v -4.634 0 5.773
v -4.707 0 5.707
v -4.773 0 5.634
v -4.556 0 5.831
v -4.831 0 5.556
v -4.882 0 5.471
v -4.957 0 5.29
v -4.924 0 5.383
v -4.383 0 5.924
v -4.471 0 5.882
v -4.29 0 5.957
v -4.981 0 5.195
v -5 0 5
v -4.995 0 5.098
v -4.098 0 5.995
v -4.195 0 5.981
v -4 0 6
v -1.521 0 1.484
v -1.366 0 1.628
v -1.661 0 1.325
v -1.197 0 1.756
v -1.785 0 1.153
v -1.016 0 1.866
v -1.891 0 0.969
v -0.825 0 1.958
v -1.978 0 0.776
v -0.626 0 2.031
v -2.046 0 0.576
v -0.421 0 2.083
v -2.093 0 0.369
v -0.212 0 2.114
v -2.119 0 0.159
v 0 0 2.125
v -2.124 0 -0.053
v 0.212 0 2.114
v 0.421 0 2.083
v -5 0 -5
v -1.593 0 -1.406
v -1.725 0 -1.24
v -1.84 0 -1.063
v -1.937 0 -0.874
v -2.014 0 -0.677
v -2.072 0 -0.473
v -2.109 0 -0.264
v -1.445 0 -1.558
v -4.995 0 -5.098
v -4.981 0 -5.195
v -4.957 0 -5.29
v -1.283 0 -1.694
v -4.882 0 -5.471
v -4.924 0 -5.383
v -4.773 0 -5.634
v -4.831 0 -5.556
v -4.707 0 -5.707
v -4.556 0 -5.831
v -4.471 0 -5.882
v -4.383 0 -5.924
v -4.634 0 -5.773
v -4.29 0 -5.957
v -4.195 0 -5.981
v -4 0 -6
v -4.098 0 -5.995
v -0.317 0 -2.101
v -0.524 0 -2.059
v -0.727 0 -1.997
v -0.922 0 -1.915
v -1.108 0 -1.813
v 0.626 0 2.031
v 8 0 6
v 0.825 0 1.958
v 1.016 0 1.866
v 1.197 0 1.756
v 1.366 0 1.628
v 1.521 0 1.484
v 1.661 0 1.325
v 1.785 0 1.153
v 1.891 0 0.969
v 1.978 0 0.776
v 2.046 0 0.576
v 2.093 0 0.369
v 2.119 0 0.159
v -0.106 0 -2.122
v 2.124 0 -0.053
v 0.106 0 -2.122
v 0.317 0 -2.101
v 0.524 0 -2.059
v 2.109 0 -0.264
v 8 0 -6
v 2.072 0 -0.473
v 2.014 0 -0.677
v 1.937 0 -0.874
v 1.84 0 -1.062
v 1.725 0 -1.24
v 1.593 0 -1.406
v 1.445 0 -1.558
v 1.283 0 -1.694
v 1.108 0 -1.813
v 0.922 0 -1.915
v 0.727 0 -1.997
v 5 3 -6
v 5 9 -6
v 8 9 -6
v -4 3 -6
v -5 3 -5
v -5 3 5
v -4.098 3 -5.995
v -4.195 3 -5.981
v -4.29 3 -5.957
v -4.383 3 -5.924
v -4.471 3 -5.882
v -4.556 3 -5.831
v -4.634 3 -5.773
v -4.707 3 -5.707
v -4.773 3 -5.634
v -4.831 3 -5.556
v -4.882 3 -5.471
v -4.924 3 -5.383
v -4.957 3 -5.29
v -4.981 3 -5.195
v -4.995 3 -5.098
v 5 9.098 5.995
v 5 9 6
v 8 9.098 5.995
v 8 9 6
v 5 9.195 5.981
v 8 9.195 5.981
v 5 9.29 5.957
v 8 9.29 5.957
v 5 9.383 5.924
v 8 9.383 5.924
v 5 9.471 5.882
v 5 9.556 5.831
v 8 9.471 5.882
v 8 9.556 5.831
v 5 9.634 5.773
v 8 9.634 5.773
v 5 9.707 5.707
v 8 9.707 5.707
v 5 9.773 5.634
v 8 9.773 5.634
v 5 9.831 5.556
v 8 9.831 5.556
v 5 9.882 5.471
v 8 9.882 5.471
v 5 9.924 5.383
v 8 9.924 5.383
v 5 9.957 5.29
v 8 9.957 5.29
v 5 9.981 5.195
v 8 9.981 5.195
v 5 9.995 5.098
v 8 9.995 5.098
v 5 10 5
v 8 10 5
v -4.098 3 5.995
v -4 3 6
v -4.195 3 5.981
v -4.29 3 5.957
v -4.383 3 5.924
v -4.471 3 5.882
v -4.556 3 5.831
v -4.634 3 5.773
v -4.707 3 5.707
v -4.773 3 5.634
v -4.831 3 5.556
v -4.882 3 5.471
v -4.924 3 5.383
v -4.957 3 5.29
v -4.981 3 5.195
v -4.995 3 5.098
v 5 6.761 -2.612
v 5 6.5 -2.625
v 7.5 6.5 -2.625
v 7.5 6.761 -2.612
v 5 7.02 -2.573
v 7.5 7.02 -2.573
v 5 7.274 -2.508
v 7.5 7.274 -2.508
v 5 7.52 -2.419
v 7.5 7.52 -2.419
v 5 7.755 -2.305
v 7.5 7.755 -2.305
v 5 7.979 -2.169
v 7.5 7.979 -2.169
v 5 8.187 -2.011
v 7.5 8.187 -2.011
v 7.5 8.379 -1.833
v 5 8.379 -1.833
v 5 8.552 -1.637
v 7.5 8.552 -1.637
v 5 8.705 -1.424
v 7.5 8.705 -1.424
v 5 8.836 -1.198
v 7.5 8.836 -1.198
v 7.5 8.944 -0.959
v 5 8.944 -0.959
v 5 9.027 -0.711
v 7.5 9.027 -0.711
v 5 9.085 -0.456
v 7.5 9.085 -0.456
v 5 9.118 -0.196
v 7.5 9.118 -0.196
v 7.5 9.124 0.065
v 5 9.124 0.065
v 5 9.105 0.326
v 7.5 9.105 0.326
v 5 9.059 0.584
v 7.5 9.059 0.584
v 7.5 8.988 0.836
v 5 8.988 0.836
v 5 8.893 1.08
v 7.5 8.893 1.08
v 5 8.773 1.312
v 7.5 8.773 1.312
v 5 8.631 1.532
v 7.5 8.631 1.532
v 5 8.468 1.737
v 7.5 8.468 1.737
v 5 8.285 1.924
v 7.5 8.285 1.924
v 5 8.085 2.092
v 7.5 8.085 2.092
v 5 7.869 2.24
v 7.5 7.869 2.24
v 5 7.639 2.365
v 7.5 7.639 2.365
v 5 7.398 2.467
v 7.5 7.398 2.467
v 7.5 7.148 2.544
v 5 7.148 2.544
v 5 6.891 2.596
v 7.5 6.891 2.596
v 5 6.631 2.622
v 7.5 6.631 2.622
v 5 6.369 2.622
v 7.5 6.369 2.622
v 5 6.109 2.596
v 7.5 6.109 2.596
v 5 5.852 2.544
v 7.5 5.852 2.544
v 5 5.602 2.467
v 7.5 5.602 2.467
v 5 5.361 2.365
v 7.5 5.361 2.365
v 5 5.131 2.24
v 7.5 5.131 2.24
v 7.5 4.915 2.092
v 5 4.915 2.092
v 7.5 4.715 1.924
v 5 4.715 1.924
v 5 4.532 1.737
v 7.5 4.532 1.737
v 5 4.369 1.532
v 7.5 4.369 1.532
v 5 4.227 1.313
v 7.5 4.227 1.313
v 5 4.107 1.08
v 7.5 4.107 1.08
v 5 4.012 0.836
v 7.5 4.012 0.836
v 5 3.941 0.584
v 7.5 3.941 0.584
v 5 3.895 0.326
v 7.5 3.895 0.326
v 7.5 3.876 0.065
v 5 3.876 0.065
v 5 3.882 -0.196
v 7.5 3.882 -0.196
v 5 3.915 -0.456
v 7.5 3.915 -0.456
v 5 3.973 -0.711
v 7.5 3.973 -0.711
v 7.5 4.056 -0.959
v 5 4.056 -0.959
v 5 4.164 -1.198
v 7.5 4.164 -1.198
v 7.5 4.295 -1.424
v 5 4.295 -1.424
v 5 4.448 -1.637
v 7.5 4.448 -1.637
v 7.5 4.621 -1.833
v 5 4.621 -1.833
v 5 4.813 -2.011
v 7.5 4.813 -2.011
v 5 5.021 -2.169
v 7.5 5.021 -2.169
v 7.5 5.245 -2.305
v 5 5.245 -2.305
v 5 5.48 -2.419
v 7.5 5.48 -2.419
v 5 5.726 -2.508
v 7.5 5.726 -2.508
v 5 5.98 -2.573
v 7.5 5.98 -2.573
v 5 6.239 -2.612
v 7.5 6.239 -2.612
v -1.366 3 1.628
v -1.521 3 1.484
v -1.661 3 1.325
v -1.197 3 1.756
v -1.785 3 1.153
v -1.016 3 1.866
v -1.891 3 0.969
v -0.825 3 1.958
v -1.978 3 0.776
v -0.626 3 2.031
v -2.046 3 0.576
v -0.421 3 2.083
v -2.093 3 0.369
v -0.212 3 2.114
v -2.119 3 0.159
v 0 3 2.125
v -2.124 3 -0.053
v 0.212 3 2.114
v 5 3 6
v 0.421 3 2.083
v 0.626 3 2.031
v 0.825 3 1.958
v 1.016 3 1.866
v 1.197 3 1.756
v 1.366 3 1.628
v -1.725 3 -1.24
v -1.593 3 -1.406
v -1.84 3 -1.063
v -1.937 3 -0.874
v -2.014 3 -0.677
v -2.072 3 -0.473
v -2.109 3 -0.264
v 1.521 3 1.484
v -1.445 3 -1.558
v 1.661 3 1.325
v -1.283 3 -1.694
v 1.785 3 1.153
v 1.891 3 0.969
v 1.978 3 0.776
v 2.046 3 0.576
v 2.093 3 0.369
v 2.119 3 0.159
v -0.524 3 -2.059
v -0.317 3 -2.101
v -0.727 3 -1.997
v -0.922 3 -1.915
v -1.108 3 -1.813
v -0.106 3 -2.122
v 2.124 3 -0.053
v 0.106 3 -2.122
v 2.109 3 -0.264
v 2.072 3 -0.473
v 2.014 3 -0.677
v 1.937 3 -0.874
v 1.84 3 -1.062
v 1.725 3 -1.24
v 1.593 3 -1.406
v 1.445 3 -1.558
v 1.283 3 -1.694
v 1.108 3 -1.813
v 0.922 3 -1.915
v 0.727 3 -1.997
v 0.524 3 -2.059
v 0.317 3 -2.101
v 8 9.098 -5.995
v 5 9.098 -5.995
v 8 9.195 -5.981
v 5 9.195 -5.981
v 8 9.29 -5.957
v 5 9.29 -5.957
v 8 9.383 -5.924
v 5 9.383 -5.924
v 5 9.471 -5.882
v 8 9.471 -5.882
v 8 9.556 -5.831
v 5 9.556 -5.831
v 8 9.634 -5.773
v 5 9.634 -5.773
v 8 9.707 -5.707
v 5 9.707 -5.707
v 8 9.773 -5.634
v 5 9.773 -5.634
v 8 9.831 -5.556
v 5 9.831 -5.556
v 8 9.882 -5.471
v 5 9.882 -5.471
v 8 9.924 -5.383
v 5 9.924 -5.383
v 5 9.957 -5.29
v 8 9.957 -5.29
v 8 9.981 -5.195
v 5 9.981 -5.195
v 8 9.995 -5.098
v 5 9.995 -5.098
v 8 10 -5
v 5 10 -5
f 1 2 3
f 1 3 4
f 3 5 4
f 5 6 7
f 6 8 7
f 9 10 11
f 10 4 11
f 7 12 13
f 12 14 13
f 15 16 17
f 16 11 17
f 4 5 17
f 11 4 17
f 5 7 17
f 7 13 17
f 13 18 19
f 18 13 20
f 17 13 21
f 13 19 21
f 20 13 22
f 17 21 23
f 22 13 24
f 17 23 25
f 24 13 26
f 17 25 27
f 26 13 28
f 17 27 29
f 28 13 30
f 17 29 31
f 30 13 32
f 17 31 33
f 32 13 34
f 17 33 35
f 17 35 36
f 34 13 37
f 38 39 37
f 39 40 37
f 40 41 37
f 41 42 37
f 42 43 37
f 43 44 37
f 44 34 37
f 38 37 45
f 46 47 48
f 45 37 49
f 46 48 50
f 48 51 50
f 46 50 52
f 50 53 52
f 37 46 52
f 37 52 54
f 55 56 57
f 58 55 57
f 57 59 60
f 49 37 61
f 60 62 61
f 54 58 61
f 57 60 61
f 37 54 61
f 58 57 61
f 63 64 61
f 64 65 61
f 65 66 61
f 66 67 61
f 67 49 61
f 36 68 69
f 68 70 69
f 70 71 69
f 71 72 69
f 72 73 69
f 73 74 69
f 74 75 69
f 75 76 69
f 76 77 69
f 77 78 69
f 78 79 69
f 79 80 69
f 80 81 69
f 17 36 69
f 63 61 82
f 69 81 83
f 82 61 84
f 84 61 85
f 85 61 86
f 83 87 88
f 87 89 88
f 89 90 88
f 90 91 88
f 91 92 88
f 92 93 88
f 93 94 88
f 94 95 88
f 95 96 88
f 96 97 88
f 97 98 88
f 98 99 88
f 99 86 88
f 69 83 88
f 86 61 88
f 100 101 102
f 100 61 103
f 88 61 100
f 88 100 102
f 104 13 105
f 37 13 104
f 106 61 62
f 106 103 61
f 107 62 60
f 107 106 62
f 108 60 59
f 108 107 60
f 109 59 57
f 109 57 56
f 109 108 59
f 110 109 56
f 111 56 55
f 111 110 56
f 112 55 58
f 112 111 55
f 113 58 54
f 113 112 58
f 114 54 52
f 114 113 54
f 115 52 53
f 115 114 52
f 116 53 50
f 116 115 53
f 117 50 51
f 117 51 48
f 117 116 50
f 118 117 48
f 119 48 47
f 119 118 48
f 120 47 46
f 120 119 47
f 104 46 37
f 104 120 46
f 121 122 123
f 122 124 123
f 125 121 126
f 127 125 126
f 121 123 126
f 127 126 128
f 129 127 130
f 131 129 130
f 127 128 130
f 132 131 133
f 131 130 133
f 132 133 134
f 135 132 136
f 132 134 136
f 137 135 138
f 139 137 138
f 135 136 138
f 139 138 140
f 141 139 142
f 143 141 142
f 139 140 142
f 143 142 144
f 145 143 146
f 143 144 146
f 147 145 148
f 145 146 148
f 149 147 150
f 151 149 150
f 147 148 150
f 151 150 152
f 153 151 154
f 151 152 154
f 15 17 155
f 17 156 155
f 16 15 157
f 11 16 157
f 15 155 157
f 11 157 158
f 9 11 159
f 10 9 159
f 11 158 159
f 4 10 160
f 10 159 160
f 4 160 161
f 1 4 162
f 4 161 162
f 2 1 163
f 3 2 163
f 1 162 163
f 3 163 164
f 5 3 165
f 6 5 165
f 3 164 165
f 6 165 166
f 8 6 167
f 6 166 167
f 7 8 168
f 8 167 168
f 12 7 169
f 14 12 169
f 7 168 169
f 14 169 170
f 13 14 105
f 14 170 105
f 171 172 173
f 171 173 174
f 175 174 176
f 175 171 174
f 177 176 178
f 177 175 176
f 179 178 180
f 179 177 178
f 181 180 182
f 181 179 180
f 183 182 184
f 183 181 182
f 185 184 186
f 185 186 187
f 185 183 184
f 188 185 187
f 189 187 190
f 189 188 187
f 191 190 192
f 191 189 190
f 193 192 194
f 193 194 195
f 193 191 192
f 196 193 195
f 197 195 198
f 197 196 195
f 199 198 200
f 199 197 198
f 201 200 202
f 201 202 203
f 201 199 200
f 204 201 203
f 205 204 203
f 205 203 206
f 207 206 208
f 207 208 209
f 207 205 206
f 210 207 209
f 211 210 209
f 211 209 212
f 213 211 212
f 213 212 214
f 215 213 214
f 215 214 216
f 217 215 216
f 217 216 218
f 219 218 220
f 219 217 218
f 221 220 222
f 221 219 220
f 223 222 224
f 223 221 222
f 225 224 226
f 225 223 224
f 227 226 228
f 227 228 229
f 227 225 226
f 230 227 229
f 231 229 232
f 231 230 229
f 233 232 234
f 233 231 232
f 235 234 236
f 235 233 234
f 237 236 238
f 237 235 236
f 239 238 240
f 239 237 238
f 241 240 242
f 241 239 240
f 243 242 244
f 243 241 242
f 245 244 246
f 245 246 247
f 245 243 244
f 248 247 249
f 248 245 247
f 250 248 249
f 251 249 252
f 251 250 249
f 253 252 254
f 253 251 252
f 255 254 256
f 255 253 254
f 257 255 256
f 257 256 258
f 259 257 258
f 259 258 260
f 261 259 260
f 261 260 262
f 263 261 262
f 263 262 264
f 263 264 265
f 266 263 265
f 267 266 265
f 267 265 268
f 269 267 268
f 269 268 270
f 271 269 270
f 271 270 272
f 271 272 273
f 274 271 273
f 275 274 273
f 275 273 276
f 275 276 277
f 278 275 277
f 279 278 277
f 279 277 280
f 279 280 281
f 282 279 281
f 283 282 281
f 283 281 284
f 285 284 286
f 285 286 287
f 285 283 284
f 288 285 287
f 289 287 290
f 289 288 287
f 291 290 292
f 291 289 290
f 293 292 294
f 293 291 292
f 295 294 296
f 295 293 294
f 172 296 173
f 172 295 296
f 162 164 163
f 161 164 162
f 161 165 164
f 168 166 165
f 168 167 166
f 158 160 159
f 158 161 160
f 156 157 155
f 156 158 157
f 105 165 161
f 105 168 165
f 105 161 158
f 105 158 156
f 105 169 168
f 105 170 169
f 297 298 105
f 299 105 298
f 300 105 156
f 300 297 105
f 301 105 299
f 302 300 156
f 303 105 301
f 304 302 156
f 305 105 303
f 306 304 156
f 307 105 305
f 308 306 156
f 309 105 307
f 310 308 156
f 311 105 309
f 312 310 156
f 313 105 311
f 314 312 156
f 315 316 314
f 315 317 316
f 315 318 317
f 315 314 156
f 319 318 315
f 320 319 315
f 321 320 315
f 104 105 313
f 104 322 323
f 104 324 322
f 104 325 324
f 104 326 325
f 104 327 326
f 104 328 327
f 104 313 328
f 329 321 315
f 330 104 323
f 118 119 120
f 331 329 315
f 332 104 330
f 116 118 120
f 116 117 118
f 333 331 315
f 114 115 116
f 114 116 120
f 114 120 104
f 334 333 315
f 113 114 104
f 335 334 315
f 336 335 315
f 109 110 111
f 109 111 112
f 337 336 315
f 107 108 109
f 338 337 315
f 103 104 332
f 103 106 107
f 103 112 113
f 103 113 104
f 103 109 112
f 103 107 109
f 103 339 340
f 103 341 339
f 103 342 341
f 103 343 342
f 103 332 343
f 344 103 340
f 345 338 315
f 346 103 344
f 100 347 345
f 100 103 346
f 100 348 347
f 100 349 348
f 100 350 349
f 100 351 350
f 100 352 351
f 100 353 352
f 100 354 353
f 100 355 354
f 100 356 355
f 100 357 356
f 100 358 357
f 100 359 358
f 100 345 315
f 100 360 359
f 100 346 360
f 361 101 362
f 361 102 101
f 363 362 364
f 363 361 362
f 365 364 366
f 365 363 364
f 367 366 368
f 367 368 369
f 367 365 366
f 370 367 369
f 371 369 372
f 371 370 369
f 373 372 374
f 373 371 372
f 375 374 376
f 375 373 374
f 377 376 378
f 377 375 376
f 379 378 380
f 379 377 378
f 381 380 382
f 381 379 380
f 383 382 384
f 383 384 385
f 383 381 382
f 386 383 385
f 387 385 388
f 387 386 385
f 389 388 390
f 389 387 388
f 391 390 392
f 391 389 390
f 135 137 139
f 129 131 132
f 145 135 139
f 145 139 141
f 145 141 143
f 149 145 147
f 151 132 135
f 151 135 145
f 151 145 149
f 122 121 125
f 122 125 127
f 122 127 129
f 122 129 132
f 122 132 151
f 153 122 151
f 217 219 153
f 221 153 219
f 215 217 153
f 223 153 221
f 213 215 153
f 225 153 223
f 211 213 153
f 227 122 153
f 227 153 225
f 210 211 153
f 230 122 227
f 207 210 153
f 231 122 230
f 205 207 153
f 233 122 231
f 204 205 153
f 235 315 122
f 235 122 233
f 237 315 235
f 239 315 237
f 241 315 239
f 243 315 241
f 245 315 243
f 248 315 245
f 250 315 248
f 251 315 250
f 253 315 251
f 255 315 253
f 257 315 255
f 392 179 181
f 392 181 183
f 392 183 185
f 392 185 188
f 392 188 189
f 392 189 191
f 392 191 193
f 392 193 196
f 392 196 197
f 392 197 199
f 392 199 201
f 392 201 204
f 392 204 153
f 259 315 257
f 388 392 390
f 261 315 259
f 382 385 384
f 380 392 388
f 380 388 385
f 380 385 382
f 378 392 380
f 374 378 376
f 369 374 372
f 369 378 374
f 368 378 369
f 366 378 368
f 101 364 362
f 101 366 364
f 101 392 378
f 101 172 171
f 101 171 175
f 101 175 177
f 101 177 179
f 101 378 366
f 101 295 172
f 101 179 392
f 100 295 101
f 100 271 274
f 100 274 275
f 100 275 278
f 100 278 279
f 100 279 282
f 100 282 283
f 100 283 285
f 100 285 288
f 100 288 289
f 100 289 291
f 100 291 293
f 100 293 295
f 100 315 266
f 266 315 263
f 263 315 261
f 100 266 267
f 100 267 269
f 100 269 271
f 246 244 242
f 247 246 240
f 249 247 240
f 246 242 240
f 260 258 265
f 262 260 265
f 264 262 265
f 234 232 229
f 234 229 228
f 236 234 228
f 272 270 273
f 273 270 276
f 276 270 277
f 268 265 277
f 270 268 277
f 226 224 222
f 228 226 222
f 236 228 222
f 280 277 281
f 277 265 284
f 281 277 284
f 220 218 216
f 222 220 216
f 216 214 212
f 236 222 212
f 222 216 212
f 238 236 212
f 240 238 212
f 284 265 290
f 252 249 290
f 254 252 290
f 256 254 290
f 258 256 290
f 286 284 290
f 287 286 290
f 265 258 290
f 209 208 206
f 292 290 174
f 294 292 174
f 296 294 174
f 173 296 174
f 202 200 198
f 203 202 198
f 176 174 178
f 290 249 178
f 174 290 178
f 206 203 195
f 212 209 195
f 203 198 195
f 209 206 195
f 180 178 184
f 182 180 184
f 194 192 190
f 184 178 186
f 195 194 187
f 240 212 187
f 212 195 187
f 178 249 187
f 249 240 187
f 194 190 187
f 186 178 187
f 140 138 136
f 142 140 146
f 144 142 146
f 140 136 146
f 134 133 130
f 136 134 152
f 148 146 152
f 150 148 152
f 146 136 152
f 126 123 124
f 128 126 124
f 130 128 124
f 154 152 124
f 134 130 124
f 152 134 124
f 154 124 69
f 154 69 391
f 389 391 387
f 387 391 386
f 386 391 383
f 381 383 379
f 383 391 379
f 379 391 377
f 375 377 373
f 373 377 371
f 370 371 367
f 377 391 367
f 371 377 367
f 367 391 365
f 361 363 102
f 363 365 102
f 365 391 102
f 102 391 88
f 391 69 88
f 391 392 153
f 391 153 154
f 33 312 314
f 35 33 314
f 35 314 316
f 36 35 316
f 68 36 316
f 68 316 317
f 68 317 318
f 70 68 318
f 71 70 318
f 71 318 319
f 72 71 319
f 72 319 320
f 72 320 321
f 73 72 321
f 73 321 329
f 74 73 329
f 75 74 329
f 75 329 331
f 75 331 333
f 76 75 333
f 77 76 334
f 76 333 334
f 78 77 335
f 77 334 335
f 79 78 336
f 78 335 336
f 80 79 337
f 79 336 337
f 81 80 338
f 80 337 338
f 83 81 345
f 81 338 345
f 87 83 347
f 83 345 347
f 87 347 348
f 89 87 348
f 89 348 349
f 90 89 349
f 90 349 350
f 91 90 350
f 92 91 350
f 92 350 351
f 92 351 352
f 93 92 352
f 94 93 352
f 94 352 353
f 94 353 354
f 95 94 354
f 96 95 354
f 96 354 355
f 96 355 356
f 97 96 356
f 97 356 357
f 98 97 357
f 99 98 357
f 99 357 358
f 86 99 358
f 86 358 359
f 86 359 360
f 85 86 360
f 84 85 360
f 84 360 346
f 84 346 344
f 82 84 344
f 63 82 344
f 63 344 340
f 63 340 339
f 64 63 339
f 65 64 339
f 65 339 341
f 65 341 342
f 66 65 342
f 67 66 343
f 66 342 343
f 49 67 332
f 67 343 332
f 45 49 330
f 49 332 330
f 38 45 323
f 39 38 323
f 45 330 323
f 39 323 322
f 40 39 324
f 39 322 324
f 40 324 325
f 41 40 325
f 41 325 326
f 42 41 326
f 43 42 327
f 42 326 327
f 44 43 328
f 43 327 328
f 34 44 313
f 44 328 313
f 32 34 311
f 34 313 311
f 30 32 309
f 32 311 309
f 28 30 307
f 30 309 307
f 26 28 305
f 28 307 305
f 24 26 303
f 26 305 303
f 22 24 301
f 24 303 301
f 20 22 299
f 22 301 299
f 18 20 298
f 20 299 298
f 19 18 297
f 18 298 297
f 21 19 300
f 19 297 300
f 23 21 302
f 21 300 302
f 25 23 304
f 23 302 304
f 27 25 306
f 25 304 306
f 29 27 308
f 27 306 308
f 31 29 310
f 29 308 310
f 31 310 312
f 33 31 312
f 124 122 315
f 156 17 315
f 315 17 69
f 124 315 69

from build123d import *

# Parameters (mm, degrees)
SKETCH_1_W          = 13
SKETCH_1_H          = 12
EXTRUDE_1_DEPTH     = 10
SHELL_1_T           = -3
SKETCH_2_R          = 2.125
CUT_EXTRUDE_1_DEPTH = 13.206555616
SKETCH_3_R          = 2.625
CUT_EXTRUDE_4_DEPTH = 2.5
FILLET_1_R          = 1


with BuildPart() as part:
    # 草圖1 → 填料-伸長1 (new body)
    with BuildSketch(Plane(origin=(0, 0, 0), x_dir=(1, 0, 0), z_dir=(0, 1, 0))):
        with Locations((1.5, 0)):
            Rectangle(SKETCH_1_W, SKETCH_1_H)
    extrude(amount=EXTRUDE_1_DEPTH)

    # 薄殼1
    shell_1_openings = [part.faces().sort_by_distance(p)[0] for p in [
        (1.5, 10, 0),
        (1.5, 5, -6),
        (1.5, 5, 6),
        (-5, 5, 0),
    ]]
    offset(amount=SHELL_1_T, openings=shell_1_openings, kind=Kind.INTERSECTION)

    # 草圖2 → 除料-伸長1 (cut, through all)
    with BuildSketch(Plane(origin=(0, 3, 0), x_dir=(1, 0, 0), z_dir=(0, 1, 0))):
        with Locations(Location((0, 0, 0), (0, 0, 270))):
            Circle(SKETCH_2_R)
    extrude(amount=-CUT_EXTRUDE_1_DEPTH, mode=Mode.SUBTRACT)

    # 草圖3 → 除料-伸長4 (cut)
    with BuildSketch(Plane(origin=(5, 0, 0), x_dir=(0, 0, -1), z_dir=(1, 0, 0))):
        with Locations((0, 6.5)):
            Circle(SKETCH_3_R)
    extrude(amount=CUT_EXTRUDE_4_DEPTH, mode=Mode.SUBTRACT)

    # 圓角1
    fillet_1_edges = [part.edges().sort_by_distance(p)[0] for p in [
        (6.5, 10, -6),
        (-5, 1.5, -6),
        (-5, 1.5, 6),
        (6.5, 10, 6),
    ]]
    fillet(fillet_1_edges, radius=FILLET_1_R)


solid = part.part
